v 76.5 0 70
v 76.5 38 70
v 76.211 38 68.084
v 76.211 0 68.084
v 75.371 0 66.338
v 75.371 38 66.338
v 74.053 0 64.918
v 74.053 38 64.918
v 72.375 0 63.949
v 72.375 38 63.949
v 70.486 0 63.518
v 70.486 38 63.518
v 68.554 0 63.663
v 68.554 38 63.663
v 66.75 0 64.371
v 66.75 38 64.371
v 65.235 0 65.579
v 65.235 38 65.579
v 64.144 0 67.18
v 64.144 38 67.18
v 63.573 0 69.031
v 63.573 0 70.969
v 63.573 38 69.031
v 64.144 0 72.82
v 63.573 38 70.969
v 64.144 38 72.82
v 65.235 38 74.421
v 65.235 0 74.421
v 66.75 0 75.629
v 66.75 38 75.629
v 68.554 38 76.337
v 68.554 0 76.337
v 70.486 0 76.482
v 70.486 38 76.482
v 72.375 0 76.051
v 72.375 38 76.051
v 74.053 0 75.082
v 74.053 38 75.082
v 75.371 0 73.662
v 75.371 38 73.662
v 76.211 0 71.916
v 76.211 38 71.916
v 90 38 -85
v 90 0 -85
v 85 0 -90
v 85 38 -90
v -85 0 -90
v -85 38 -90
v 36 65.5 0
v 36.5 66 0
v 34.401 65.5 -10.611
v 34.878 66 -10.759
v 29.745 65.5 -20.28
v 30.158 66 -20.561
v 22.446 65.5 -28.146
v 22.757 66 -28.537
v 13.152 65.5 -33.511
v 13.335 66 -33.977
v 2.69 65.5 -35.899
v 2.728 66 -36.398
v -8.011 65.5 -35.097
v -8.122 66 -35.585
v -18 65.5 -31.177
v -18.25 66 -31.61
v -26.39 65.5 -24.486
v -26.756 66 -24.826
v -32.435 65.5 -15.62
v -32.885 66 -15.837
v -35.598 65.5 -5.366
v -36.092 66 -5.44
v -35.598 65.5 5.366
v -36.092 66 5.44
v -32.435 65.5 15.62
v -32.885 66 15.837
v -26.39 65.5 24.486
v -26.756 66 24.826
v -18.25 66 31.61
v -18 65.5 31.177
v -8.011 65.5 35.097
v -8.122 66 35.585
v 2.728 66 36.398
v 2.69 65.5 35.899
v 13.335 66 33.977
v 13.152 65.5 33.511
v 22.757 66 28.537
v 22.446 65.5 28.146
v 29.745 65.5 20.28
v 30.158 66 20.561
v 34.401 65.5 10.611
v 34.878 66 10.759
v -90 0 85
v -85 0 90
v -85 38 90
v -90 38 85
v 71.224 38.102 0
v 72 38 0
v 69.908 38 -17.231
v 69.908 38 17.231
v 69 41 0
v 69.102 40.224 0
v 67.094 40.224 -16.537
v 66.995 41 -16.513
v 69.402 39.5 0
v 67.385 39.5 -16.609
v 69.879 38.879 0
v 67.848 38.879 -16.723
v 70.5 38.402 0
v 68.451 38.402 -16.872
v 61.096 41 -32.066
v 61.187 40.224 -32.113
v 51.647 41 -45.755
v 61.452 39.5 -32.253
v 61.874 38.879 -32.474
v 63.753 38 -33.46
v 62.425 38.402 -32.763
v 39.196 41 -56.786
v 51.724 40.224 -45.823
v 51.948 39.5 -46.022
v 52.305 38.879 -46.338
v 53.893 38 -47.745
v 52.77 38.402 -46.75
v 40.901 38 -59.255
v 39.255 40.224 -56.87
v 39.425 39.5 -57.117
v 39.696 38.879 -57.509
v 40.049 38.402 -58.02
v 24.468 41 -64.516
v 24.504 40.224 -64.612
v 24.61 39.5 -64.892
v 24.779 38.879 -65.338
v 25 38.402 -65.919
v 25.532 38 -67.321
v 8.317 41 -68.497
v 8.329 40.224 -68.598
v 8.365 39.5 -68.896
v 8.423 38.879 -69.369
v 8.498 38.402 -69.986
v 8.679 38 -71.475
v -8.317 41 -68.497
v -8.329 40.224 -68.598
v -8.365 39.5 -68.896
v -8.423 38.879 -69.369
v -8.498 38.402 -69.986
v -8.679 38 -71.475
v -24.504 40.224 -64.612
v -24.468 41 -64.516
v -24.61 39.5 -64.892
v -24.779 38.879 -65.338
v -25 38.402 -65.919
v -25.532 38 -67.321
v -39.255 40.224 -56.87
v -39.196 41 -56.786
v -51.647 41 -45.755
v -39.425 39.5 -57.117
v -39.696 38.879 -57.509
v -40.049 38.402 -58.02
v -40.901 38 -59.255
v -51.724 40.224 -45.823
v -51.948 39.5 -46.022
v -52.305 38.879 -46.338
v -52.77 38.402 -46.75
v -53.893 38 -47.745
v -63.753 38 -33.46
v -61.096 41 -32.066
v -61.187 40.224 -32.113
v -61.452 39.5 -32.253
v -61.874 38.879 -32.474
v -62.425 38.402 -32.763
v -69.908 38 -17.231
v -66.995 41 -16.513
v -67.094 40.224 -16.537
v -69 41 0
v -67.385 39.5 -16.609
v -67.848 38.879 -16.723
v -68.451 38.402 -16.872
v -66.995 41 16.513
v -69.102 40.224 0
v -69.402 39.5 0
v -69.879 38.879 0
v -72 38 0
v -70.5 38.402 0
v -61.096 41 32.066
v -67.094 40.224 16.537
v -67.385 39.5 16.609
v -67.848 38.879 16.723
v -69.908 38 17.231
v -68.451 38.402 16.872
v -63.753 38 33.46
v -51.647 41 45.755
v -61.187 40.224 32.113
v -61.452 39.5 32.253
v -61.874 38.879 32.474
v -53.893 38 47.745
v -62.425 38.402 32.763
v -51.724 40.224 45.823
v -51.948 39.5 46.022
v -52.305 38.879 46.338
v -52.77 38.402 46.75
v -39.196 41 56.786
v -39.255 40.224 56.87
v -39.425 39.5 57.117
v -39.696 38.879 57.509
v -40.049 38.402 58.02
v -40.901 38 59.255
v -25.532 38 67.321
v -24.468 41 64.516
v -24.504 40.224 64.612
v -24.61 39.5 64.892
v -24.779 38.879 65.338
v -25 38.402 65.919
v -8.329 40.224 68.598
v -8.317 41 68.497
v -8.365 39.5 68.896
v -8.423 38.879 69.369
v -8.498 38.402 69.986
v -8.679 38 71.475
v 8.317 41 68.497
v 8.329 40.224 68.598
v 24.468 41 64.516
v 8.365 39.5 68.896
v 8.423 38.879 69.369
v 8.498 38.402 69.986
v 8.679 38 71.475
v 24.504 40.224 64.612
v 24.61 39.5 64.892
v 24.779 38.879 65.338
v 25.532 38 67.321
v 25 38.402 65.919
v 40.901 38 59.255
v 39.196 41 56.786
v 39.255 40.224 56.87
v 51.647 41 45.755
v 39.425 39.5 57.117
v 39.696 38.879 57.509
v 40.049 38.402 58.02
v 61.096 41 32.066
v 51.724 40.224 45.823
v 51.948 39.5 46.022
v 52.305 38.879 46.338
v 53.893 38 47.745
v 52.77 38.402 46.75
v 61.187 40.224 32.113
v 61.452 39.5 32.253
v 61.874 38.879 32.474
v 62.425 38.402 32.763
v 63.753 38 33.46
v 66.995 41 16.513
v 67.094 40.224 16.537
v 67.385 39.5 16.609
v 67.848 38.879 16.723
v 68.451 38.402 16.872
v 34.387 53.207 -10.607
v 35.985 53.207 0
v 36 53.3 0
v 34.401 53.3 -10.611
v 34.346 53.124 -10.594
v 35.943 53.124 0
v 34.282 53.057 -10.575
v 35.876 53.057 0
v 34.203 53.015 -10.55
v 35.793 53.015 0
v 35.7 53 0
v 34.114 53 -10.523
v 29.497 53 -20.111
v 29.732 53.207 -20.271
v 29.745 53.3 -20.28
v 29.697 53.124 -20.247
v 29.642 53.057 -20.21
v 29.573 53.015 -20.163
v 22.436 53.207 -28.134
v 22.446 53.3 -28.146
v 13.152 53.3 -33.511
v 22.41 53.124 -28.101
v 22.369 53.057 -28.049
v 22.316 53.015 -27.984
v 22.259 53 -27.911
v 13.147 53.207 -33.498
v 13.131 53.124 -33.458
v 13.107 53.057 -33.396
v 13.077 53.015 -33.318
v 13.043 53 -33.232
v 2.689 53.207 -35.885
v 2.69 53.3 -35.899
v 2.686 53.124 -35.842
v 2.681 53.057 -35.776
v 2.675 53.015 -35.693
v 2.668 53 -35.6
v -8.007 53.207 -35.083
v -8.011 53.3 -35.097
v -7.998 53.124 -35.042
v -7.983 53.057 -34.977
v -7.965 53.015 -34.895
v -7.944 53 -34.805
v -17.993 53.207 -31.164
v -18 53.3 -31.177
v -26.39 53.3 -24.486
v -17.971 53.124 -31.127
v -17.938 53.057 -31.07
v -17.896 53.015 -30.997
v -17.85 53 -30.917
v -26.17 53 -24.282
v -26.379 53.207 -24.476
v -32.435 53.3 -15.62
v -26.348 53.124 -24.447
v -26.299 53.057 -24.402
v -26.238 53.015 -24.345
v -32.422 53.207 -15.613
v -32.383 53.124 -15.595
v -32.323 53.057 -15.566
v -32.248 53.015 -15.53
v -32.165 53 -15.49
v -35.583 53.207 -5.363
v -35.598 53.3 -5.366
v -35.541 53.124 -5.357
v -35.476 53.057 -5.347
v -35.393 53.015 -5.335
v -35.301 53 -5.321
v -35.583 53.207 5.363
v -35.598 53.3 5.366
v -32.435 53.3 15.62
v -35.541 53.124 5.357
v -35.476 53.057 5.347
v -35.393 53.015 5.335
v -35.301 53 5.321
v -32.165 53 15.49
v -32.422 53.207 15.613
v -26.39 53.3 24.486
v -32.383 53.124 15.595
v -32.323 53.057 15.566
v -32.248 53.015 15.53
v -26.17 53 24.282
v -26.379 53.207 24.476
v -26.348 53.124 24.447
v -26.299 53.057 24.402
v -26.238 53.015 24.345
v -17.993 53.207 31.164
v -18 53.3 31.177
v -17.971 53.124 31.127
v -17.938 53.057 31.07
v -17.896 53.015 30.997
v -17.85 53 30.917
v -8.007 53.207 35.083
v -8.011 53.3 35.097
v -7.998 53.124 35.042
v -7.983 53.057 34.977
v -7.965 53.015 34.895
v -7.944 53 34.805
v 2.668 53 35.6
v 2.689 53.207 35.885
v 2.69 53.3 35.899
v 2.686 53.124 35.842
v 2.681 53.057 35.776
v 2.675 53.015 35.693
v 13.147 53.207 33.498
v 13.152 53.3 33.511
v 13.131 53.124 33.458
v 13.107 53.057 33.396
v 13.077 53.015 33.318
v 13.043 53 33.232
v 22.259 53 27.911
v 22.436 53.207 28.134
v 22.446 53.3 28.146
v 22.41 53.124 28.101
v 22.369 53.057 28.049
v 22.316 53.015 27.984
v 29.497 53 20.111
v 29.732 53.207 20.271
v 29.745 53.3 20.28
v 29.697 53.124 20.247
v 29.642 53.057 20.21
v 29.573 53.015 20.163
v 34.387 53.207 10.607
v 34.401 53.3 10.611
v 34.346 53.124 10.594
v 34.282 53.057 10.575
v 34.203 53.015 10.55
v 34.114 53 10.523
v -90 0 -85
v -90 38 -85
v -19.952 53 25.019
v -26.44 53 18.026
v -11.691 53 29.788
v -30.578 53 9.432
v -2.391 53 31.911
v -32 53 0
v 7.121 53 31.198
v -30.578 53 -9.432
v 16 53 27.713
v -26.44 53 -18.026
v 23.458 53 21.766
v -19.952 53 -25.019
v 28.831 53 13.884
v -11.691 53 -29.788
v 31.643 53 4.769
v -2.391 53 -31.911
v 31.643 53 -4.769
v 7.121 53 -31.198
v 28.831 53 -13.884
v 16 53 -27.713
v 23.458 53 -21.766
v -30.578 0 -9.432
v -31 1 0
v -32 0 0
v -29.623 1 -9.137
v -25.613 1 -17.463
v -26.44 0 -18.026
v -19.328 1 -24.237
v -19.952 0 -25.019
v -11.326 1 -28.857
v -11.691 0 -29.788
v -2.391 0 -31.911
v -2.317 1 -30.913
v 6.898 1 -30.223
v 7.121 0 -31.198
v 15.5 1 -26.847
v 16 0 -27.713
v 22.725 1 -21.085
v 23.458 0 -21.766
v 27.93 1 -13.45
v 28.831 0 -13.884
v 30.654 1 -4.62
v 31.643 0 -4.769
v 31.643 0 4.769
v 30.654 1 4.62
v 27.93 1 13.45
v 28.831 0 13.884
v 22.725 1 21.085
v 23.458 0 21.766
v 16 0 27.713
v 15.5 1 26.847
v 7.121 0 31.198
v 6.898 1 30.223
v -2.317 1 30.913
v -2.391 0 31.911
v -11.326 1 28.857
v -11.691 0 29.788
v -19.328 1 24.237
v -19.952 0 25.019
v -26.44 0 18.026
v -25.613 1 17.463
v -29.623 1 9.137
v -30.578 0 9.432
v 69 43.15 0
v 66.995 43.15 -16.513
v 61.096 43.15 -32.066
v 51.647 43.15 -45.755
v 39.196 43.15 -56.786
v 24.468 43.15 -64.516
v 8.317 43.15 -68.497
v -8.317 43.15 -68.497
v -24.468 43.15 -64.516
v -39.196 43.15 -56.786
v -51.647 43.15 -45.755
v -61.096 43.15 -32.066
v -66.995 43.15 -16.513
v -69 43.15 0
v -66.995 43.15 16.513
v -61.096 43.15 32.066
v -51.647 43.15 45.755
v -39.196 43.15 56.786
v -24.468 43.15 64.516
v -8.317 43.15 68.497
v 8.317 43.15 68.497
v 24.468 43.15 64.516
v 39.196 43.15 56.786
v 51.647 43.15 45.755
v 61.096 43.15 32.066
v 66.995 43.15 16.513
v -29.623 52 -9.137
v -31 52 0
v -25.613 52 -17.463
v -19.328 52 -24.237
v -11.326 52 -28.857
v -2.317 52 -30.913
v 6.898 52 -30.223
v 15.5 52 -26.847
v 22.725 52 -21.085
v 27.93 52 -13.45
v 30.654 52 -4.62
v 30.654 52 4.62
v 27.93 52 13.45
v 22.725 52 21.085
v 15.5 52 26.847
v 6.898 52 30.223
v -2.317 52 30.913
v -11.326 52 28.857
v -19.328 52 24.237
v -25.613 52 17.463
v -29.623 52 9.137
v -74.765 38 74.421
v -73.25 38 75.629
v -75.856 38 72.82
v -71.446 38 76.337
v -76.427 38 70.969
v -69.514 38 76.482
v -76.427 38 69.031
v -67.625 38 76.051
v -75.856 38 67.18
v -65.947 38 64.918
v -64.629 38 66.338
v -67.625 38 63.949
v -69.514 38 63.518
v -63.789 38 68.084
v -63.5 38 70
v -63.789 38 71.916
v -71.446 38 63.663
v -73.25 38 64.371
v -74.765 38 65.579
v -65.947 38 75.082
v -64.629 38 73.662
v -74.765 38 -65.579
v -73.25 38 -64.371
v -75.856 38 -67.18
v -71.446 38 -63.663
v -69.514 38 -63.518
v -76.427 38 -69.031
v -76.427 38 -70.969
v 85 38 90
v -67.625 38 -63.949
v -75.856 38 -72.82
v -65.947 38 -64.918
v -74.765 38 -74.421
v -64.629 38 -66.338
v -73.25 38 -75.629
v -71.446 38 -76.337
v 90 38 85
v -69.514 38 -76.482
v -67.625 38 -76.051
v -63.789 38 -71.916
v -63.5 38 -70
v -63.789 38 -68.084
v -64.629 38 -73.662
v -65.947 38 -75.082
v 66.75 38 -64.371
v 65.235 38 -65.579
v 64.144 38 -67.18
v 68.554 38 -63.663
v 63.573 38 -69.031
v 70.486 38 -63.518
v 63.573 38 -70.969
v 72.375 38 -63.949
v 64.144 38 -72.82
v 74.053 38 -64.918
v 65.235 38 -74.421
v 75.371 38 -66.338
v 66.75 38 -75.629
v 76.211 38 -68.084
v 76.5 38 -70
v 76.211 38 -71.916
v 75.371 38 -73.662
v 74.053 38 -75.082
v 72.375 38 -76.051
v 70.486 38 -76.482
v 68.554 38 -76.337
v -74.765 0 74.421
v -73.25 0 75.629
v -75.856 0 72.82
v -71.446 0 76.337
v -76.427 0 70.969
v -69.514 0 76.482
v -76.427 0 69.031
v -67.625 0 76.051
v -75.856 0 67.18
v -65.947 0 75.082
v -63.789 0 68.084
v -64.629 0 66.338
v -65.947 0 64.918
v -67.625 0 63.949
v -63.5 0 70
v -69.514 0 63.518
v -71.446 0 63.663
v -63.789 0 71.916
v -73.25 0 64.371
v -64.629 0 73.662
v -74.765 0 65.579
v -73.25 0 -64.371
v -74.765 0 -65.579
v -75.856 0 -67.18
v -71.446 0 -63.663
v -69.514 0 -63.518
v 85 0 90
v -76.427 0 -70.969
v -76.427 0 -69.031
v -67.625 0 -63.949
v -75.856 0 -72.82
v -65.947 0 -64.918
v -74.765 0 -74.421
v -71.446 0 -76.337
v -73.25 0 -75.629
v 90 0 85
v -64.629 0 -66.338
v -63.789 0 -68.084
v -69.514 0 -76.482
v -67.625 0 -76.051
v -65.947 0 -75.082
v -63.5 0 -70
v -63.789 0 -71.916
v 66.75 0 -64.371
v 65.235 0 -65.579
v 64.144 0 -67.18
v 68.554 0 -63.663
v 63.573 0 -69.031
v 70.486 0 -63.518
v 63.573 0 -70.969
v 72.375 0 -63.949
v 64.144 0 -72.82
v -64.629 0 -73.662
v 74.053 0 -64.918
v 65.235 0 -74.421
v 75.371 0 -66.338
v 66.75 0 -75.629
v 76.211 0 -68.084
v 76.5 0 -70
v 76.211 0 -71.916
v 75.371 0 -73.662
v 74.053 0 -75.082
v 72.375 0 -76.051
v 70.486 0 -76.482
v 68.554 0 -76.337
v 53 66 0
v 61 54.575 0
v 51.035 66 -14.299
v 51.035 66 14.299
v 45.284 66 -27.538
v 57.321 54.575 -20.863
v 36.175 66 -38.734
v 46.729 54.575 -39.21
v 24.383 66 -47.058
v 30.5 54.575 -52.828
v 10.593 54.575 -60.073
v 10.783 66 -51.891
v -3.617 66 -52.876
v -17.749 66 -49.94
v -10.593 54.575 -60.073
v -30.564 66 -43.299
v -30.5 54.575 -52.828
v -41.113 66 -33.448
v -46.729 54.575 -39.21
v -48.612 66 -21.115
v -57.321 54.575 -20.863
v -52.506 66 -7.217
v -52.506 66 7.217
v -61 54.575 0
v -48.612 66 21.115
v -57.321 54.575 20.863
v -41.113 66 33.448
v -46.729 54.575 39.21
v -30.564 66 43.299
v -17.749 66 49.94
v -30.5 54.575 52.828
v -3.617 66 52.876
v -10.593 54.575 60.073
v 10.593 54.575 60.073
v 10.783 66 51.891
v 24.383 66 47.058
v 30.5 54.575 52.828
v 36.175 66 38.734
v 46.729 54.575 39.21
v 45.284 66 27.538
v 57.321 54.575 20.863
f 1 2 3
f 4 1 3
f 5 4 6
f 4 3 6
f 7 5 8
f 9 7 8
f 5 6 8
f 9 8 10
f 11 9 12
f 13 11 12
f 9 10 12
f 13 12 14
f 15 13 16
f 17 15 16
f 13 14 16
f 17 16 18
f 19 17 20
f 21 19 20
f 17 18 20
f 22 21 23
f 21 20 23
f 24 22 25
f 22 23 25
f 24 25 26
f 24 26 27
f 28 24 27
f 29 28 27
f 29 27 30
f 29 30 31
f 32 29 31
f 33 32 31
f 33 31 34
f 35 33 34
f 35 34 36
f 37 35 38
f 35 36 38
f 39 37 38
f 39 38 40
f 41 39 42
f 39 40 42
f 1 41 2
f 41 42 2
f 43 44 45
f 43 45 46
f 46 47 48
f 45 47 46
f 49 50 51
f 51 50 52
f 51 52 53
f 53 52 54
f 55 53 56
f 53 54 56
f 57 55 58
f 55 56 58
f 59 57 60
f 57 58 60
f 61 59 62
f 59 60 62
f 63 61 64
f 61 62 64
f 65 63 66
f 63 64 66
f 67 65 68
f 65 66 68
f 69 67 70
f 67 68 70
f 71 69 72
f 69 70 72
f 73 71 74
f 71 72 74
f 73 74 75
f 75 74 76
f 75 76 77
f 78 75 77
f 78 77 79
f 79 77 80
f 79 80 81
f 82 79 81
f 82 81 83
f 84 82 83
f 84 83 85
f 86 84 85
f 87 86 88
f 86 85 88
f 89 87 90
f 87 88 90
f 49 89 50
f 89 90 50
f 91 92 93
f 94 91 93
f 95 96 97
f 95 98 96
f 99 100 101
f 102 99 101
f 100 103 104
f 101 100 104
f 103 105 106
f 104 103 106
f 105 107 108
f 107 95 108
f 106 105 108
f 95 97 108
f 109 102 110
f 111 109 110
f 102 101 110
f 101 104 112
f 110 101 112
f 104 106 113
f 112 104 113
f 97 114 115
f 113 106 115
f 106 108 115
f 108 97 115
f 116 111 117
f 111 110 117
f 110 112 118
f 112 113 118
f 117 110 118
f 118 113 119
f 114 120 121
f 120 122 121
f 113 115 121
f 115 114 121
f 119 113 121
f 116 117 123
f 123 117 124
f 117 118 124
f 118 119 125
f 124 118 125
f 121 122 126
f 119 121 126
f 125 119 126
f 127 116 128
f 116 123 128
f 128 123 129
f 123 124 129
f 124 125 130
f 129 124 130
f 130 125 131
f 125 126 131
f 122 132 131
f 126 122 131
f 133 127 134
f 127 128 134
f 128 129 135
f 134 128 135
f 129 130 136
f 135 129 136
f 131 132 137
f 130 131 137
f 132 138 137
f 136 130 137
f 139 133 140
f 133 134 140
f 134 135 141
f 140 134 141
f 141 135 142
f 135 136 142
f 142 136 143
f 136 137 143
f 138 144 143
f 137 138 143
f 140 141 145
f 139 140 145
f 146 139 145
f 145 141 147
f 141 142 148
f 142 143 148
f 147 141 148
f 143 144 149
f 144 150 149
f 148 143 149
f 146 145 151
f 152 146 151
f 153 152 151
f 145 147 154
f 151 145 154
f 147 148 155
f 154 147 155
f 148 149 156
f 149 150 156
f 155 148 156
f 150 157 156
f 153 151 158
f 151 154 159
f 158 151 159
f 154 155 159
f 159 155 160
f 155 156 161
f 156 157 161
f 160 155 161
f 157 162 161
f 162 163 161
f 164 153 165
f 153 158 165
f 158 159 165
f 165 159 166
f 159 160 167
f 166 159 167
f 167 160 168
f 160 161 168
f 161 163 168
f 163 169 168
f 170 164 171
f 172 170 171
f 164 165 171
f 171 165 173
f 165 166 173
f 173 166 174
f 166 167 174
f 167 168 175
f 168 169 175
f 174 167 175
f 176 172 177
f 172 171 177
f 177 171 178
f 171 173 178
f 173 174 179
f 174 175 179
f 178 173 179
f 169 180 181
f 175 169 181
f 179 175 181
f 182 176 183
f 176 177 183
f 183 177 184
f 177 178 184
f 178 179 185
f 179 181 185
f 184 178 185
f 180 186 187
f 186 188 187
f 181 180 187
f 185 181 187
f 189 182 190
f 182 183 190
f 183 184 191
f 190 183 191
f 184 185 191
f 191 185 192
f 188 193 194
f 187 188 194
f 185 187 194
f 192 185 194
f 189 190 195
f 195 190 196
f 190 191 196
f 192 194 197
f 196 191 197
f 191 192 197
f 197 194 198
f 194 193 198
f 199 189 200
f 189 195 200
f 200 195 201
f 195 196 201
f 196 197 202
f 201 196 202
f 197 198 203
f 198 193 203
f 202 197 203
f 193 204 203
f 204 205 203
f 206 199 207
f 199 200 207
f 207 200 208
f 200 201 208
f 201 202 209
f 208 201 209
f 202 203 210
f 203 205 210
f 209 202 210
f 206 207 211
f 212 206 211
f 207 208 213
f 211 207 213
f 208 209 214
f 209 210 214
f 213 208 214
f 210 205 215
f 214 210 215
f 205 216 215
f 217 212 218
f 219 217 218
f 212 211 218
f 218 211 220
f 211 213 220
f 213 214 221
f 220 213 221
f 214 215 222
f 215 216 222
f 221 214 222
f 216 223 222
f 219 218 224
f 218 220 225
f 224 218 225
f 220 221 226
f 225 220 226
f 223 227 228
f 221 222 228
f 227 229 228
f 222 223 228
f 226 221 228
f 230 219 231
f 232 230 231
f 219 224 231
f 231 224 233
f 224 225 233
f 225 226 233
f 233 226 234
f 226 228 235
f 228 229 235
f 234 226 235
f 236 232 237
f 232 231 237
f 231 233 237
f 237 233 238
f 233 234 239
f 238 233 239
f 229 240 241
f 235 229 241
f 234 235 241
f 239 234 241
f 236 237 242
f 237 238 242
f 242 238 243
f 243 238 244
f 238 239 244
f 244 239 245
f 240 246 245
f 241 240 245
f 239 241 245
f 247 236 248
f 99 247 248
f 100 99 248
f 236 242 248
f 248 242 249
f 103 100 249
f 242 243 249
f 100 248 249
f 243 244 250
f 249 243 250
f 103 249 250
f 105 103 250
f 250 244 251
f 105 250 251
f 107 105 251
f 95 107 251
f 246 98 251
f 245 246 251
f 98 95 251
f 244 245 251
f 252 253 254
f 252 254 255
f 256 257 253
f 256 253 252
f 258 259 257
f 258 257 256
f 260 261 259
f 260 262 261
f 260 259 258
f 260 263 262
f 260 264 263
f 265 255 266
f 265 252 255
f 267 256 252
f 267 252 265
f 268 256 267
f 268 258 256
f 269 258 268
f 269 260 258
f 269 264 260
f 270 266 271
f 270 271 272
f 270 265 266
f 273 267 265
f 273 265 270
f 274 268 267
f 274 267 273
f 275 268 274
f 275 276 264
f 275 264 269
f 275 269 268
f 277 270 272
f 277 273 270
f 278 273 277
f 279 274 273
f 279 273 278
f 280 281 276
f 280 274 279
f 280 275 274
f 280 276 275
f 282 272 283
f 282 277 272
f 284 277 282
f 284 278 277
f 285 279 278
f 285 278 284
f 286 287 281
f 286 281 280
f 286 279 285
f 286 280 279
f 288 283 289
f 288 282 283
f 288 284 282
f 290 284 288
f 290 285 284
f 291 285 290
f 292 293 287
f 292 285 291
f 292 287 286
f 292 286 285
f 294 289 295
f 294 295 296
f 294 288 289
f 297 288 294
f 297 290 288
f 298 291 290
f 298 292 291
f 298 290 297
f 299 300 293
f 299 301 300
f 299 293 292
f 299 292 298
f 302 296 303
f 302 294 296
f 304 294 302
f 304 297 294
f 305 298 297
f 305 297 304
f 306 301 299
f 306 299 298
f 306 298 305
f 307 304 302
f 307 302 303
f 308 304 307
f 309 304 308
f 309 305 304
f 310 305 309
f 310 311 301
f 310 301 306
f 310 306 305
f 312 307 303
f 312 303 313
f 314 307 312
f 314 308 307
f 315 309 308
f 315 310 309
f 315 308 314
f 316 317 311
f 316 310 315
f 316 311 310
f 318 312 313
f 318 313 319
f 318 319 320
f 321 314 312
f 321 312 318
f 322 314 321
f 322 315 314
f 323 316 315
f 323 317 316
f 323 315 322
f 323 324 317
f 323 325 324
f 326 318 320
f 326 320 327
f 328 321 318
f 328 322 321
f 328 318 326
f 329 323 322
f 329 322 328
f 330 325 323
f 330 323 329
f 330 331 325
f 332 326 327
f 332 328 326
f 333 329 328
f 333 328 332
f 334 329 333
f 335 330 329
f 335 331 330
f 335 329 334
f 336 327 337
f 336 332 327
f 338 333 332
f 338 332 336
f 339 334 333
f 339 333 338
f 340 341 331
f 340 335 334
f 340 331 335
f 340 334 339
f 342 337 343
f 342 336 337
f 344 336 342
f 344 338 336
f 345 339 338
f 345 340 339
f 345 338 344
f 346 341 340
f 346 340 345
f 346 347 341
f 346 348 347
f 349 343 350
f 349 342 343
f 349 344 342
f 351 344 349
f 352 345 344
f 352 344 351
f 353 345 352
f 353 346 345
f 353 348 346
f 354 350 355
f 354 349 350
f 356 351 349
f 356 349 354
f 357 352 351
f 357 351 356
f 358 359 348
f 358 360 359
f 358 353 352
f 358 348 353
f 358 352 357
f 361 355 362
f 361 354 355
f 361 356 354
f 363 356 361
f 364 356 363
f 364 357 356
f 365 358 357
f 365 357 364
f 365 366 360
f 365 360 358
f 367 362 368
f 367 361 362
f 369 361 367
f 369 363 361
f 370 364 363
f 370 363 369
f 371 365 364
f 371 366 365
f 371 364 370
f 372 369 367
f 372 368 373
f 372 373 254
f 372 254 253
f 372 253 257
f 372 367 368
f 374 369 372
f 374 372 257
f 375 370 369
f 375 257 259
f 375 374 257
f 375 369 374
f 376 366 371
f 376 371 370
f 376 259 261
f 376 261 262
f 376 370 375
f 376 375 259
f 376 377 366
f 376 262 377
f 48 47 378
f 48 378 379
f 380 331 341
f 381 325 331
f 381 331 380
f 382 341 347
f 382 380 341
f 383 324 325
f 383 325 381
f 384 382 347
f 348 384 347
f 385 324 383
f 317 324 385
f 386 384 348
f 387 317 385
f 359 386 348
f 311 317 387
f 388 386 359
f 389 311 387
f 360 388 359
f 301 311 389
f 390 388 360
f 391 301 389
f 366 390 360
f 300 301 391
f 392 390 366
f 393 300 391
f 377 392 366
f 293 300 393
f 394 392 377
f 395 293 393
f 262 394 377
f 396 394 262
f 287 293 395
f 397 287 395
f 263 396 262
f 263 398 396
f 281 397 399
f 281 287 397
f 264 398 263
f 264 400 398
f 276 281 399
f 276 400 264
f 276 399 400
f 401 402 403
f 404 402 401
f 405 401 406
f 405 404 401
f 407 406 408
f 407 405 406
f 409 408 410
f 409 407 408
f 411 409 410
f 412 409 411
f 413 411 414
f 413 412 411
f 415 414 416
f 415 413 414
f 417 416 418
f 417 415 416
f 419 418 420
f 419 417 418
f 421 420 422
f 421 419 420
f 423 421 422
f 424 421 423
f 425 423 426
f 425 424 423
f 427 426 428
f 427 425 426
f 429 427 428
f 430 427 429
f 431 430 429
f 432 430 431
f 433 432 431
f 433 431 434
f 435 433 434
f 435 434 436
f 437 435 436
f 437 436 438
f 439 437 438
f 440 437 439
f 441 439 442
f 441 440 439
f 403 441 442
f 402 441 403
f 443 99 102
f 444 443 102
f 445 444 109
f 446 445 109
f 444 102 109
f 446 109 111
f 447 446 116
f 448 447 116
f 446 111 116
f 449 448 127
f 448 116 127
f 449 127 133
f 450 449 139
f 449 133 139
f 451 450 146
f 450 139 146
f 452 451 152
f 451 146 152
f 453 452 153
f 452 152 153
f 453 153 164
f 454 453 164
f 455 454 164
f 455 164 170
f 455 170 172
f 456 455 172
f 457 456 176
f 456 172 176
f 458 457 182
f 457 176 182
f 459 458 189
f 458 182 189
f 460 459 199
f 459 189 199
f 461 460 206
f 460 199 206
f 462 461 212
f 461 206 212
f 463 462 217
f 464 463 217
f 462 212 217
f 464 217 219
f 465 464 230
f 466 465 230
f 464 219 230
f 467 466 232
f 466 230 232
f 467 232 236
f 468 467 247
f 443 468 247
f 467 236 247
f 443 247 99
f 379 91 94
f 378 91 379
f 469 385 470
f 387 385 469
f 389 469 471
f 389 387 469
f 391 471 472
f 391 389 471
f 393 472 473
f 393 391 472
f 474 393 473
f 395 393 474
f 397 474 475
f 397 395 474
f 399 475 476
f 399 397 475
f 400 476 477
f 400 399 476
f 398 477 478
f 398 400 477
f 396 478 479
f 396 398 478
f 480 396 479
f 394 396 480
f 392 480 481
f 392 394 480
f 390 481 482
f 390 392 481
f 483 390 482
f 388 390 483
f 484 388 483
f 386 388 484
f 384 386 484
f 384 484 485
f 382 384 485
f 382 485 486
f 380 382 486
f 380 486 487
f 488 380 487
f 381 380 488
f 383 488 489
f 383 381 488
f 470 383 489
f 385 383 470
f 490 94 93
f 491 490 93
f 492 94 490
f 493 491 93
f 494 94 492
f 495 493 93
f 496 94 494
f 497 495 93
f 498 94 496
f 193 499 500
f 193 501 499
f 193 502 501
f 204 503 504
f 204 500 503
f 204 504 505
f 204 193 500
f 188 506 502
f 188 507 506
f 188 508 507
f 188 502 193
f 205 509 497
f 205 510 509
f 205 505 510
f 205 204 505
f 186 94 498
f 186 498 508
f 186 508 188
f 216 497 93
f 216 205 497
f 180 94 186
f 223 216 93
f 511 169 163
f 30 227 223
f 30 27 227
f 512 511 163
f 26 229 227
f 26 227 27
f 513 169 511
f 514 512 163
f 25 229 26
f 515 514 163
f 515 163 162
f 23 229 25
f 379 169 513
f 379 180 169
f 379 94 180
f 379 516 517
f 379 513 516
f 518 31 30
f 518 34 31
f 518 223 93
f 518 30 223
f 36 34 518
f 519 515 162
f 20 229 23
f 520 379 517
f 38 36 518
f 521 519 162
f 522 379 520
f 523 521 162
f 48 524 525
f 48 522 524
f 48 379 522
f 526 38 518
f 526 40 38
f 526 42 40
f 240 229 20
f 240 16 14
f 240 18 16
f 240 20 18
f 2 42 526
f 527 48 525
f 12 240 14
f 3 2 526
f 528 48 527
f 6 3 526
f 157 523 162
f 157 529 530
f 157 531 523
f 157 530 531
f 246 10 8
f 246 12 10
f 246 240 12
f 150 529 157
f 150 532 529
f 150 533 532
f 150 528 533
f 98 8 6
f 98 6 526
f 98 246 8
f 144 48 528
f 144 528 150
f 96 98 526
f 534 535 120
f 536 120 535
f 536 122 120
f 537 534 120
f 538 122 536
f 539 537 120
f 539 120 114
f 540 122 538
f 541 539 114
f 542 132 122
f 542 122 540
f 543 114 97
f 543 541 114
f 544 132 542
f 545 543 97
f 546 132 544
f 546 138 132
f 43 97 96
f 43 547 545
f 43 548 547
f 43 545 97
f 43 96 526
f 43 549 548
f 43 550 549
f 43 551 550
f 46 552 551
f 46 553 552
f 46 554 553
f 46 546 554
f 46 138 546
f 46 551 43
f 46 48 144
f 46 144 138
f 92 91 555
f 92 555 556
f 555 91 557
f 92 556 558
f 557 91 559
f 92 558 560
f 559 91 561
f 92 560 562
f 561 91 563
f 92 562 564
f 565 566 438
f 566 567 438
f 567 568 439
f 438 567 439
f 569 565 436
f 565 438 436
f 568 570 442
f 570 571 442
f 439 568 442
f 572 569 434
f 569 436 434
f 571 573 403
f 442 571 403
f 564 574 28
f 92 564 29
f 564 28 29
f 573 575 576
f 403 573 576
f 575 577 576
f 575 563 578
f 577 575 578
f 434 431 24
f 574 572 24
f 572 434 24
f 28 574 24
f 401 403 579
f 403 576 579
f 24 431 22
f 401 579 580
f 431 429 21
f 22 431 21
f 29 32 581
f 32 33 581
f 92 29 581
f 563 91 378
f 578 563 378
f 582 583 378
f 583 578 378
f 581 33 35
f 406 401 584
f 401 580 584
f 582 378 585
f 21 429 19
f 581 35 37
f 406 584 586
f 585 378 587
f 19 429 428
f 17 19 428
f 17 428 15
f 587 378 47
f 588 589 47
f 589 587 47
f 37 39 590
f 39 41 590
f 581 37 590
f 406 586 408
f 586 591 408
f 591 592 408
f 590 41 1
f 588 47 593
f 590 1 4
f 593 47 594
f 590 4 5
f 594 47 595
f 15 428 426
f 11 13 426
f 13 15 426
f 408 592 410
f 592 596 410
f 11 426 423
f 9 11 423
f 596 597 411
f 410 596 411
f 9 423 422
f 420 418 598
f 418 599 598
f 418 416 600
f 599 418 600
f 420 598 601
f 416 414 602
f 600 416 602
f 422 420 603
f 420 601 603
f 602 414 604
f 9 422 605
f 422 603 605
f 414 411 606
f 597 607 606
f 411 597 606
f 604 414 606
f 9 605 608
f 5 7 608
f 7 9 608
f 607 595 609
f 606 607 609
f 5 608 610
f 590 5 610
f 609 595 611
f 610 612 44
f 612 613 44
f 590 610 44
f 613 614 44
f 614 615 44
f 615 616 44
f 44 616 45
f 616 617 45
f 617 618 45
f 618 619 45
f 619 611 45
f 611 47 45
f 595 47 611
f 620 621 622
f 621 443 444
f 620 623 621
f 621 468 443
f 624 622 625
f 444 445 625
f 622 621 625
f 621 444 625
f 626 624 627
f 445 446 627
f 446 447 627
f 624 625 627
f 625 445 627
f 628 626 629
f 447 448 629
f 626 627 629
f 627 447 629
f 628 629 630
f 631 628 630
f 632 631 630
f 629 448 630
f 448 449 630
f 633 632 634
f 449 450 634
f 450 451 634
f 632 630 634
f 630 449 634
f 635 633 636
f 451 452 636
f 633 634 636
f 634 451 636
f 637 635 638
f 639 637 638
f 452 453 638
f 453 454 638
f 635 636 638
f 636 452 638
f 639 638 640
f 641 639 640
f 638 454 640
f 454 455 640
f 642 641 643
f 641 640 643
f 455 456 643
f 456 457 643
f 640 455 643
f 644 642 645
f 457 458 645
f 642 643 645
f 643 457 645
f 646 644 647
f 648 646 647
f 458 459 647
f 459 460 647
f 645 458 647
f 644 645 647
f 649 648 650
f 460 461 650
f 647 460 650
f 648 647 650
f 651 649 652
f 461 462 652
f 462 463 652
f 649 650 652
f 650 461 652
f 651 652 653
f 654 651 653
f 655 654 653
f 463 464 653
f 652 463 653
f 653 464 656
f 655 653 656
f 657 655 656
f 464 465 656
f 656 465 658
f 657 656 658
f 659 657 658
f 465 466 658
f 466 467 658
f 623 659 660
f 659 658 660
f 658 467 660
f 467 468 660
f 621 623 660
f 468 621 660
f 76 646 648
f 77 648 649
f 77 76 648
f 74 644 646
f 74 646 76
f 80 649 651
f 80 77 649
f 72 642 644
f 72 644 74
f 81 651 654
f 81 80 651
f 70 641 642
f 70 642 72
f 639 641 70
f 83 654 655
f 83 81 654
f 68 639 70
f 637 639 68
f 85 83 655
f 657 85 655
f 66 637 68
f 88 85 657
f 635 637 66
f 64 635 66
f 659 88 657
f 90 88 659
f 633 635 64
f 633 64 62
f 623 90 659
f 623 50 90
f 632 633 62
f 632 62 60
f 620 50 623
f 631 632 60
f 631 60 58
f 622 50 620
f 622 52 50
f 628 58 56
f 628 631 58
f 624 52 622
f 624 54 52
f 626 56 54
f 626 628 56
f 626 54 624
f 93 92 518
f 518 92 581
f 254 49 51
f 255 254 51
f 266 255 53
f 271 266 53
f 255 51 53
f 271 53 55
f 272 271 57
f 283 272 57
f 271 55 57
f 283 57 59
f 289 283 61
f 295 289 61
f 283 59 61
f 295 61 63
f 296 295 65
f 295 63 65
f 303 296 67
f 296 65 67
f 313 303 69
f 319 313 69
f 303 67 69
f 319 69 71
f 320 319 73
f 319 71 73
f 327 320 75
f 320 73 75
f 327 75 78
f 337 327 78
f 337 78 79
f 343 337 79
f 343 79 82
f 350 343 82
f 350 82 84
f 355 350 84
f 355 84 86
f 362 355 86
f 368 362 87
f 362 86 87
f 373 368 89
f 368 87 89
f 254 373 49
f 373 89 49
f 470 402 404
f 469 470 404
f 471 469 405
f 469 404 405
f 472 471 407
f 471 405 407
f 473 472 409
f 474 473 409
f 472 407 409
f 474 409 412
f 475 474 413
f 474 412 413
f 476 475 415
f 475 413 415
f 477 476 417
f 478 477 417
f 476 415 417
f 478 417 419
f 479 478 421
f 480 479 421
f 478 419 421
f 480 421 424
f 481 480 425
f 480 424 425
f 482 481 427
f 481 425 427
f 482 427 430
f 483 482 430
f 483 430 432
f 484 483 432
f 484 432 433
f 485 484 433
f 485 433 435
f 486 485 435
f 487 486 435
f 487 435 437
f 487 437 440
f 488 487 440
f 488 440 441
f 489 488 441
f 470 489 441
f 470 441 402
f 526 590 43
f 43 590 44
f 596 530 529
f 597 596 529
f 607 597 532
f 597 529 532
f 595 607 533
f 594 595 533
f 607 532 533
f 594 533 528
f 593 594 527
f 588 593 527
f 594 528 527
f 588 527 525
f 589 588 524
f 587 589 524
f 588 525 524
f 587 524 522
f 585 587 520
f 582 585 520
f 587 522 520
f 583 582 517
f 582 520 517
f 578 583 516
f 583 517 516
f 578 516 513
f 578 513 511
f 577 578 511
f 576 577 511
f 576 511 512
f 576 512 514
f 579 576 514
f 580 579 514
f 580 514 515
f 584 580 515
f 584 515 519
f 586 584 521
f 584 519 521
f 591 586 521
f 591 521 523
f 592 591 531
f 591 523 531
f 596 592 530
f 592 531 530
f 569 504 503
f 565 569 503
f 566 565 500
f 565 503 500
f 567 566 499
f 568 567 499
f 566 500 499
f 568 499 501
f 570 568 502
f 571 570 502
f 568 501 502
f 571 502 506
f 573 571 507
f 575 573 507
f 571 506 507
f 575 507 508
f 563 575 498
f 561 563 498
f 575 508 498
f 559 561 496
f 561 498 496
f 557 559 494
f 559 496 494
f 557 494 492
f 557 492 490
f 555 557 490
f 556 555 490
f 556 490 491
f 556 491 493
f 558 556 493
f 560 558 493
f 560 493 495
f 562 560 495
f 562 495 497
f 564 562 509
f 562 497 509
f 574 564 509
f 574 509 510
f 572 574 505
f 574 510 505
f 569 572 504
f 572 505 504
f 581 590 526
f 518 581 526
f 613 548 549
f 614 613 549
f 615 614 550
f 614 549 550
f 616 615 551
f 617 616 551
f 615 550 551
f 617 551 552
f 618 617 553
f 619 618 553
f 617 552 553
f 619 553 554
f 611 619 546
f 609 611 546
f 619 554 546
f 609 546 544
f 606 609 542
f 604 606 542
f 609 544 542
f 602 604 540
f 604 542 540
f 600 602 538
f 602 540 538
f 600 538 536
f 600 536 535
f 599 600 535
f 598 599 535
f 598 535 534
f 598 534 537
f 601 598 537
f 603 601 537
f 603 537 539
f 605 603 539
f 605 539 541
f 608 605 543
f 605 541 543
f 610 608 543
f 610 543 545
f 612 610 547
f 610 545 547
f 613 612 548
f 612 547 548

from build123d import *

# Parameters (mm, degrees)
SKETCH1_W            = 180
SKETCH1_H            = 180
BOSS_EXTRUDE1_DEPTH  = 38
SKETCH2_R            = 69
BOSS_EXTRUDE2_DEPTH  = 28
CHAMFER3_SIZE        = 16
CHAMFER3_SIZE2       = 22.850368108
SKETCH3_R            = 36
CUT_EXTRUDE1_DEPTH   = 13
CUT_EXTRUDE2_REACH   = 145.374
SKETCH4_R            = 31
CUT_EXTRUDE3_REACH   = 134.831
SKETCH5_R            = 6.5
LPATTERN1_COUNT      = 2
LPATTERN1_PITCH      = 140
LPATTERN1_COUNT_DIR2 = 2
LPATTERN1_PITCH_DIR2 = 140
CHAMFER4_SIZE        = 5
CHAMFER5_SIZE        = 1
CHAMFER6_SIZE        = 0.5
FILLET1_R            = 0.3
FILLET2_R            = 3


with BuildPart() as part:
    # Sketch1 → Boss-Extrude1 (new body)
    with BuildSketch(Plane(origin=(0, 0, 0), x_dir=(1, 0, 0), z_dir=(0, 1, 0))):
        Rectangle(SKETCH1_W, SKETCH1_H)
    extrude(amount=BOSS_EXTRUDE1_DEPTH)

    # Sketch2 → Boss-Extrude2 (add)
    with BuildSketch(Plane(origin=(0, 38, 0), x_dir=(1, 0, 0), z_dir=(0, 1, 0))):
        Circle(SKETCH2_R)
    extrude(amount=BOSS_EXTRUDE2_DEPTH)

    # Chamfer3
    chamfer3_edges = [part.edges().sort_by_distance(p)[0] for p in [
        (-69, 66, 0),
    ]]
    chamfer3_side = [part.faces().sort_by_distance(p)[0] for p in [
        (0, 66, 0),
    ]]
    chamfer(chamfer3_edges, length=CHAMFER3_SIZE, length2=CHAMFER3_SIZE2, reference=chamfer3_side[0])

    # Sketch3 → Cut-Extrude1 (cut)
    with BuildSketch(Plane(origin=(0, 66, 0), x_dir=(1, 0, 0), z_dir=(0, 1, 0))):
        Circle(SKETCH3_R)
    extrude(amount=-CUT_EXTRUDE1_DEPTH, mode=Mode.SUBTRACT)

    # Sketch4 → Cut-Extrude2 (cut, up to next)
    with BuildSketch(Plane(origin=(0, 0, 0), x_dir=(-1, 0, 0), z_dir=(0, -1, 0)), mode=Mode.PRIVATE) as cut_extrude2_sk1:
        Circle(SKETCH4_R)
    cut_extrude2_tool1 = extrude(cut_extrude2_sk1.sketch, amount=-CUT_EXTRUDE2_REACH, mode=Mode.PRIVATE) & part.part
    add(cut_extrude2_tool1.solids().sort_by_distance((0, 0, 0))[0], mode=Mode.SUBTRACT)

    # Sketch5 → Cut-Extrude3 (cut, up to next)
    with BuildSketch(Plane(origin=(0, 38, 0), x_dir=(1, 0, 0), z_dir=(0, 1, 0)), mode=Mode.PRIVATE) as cut_extrude3_sk1:
        with Locations((-70, 70)):
            Circle(SKETCH5_R)
    cut_extrude3_tool1 = extrude(cut_extrude3_sk1.sketch, amount=-CUT_EXTRUDE3_REACH, mode=Mode.PRIVATE) & part.part
    cut_extrude3 = cut_extrude3_tool1.solids().sort_by_distance((-70, 38, -70))[0]
    add(cut_extrude3, mode=Mode.SUBTRACT)

    # LPattern1: Cut-Extrude3 2 × 2
    with Locations(*[(i * LPATTERN1_PITCH, 0, j * LPATTERN1_PITCH_DIR2) for i in range(LPATTERN1_COUNT) for j in range(LPATTERN1_COUNT_DIR2) if (i, j) != (0, 0)]):
        add(cut_extrude3, mode=Mode.SUBTRACT)

    # Chamfer4
    chamfer4_edges = [part.edges().sort_by_distance(p)[0] for p in [
        (-90, 19, -90),
        (90, 19, -90),
        (-90, 19, 90),
        (90, 19, 90),
    ]]
    chamfer(chamfer4_edges, length=CHAMFER4_SIZE)

    # Chamfer5
    chamfer5_edges = [part.edges().sort_by_distance(p)[0] for p in [
        (31, 0, 0),
        (31, 53, 0),
    ]]
    chamfer(chamfer5_edges, length=CHAMFER5_SIZE)

    # Chamfer6
    chamfer6_edges = [part.edges().sort_by_distance(p)[0] for p in [
        (-36, 66, 0),
    ]]
    chamfer(chamfer6_edges, length=CHAMFER6_SIZE)

    # Fillet1
    fillet1_edges = [part.edges().sort_by_distance(p)[0] for p in [
        (-36, 53, 0),
    ]]
    fillet(fillet1_edges, radius=FILLET1_R)

    # Fillet2
    fillet2_edges = [part.edges().sort_by_distance(p)[0] for p in [
        (-69, 38, 0),
    ]]
    fillet(fillet2_edges, radius=FILLET2_R)


solid = part.part
